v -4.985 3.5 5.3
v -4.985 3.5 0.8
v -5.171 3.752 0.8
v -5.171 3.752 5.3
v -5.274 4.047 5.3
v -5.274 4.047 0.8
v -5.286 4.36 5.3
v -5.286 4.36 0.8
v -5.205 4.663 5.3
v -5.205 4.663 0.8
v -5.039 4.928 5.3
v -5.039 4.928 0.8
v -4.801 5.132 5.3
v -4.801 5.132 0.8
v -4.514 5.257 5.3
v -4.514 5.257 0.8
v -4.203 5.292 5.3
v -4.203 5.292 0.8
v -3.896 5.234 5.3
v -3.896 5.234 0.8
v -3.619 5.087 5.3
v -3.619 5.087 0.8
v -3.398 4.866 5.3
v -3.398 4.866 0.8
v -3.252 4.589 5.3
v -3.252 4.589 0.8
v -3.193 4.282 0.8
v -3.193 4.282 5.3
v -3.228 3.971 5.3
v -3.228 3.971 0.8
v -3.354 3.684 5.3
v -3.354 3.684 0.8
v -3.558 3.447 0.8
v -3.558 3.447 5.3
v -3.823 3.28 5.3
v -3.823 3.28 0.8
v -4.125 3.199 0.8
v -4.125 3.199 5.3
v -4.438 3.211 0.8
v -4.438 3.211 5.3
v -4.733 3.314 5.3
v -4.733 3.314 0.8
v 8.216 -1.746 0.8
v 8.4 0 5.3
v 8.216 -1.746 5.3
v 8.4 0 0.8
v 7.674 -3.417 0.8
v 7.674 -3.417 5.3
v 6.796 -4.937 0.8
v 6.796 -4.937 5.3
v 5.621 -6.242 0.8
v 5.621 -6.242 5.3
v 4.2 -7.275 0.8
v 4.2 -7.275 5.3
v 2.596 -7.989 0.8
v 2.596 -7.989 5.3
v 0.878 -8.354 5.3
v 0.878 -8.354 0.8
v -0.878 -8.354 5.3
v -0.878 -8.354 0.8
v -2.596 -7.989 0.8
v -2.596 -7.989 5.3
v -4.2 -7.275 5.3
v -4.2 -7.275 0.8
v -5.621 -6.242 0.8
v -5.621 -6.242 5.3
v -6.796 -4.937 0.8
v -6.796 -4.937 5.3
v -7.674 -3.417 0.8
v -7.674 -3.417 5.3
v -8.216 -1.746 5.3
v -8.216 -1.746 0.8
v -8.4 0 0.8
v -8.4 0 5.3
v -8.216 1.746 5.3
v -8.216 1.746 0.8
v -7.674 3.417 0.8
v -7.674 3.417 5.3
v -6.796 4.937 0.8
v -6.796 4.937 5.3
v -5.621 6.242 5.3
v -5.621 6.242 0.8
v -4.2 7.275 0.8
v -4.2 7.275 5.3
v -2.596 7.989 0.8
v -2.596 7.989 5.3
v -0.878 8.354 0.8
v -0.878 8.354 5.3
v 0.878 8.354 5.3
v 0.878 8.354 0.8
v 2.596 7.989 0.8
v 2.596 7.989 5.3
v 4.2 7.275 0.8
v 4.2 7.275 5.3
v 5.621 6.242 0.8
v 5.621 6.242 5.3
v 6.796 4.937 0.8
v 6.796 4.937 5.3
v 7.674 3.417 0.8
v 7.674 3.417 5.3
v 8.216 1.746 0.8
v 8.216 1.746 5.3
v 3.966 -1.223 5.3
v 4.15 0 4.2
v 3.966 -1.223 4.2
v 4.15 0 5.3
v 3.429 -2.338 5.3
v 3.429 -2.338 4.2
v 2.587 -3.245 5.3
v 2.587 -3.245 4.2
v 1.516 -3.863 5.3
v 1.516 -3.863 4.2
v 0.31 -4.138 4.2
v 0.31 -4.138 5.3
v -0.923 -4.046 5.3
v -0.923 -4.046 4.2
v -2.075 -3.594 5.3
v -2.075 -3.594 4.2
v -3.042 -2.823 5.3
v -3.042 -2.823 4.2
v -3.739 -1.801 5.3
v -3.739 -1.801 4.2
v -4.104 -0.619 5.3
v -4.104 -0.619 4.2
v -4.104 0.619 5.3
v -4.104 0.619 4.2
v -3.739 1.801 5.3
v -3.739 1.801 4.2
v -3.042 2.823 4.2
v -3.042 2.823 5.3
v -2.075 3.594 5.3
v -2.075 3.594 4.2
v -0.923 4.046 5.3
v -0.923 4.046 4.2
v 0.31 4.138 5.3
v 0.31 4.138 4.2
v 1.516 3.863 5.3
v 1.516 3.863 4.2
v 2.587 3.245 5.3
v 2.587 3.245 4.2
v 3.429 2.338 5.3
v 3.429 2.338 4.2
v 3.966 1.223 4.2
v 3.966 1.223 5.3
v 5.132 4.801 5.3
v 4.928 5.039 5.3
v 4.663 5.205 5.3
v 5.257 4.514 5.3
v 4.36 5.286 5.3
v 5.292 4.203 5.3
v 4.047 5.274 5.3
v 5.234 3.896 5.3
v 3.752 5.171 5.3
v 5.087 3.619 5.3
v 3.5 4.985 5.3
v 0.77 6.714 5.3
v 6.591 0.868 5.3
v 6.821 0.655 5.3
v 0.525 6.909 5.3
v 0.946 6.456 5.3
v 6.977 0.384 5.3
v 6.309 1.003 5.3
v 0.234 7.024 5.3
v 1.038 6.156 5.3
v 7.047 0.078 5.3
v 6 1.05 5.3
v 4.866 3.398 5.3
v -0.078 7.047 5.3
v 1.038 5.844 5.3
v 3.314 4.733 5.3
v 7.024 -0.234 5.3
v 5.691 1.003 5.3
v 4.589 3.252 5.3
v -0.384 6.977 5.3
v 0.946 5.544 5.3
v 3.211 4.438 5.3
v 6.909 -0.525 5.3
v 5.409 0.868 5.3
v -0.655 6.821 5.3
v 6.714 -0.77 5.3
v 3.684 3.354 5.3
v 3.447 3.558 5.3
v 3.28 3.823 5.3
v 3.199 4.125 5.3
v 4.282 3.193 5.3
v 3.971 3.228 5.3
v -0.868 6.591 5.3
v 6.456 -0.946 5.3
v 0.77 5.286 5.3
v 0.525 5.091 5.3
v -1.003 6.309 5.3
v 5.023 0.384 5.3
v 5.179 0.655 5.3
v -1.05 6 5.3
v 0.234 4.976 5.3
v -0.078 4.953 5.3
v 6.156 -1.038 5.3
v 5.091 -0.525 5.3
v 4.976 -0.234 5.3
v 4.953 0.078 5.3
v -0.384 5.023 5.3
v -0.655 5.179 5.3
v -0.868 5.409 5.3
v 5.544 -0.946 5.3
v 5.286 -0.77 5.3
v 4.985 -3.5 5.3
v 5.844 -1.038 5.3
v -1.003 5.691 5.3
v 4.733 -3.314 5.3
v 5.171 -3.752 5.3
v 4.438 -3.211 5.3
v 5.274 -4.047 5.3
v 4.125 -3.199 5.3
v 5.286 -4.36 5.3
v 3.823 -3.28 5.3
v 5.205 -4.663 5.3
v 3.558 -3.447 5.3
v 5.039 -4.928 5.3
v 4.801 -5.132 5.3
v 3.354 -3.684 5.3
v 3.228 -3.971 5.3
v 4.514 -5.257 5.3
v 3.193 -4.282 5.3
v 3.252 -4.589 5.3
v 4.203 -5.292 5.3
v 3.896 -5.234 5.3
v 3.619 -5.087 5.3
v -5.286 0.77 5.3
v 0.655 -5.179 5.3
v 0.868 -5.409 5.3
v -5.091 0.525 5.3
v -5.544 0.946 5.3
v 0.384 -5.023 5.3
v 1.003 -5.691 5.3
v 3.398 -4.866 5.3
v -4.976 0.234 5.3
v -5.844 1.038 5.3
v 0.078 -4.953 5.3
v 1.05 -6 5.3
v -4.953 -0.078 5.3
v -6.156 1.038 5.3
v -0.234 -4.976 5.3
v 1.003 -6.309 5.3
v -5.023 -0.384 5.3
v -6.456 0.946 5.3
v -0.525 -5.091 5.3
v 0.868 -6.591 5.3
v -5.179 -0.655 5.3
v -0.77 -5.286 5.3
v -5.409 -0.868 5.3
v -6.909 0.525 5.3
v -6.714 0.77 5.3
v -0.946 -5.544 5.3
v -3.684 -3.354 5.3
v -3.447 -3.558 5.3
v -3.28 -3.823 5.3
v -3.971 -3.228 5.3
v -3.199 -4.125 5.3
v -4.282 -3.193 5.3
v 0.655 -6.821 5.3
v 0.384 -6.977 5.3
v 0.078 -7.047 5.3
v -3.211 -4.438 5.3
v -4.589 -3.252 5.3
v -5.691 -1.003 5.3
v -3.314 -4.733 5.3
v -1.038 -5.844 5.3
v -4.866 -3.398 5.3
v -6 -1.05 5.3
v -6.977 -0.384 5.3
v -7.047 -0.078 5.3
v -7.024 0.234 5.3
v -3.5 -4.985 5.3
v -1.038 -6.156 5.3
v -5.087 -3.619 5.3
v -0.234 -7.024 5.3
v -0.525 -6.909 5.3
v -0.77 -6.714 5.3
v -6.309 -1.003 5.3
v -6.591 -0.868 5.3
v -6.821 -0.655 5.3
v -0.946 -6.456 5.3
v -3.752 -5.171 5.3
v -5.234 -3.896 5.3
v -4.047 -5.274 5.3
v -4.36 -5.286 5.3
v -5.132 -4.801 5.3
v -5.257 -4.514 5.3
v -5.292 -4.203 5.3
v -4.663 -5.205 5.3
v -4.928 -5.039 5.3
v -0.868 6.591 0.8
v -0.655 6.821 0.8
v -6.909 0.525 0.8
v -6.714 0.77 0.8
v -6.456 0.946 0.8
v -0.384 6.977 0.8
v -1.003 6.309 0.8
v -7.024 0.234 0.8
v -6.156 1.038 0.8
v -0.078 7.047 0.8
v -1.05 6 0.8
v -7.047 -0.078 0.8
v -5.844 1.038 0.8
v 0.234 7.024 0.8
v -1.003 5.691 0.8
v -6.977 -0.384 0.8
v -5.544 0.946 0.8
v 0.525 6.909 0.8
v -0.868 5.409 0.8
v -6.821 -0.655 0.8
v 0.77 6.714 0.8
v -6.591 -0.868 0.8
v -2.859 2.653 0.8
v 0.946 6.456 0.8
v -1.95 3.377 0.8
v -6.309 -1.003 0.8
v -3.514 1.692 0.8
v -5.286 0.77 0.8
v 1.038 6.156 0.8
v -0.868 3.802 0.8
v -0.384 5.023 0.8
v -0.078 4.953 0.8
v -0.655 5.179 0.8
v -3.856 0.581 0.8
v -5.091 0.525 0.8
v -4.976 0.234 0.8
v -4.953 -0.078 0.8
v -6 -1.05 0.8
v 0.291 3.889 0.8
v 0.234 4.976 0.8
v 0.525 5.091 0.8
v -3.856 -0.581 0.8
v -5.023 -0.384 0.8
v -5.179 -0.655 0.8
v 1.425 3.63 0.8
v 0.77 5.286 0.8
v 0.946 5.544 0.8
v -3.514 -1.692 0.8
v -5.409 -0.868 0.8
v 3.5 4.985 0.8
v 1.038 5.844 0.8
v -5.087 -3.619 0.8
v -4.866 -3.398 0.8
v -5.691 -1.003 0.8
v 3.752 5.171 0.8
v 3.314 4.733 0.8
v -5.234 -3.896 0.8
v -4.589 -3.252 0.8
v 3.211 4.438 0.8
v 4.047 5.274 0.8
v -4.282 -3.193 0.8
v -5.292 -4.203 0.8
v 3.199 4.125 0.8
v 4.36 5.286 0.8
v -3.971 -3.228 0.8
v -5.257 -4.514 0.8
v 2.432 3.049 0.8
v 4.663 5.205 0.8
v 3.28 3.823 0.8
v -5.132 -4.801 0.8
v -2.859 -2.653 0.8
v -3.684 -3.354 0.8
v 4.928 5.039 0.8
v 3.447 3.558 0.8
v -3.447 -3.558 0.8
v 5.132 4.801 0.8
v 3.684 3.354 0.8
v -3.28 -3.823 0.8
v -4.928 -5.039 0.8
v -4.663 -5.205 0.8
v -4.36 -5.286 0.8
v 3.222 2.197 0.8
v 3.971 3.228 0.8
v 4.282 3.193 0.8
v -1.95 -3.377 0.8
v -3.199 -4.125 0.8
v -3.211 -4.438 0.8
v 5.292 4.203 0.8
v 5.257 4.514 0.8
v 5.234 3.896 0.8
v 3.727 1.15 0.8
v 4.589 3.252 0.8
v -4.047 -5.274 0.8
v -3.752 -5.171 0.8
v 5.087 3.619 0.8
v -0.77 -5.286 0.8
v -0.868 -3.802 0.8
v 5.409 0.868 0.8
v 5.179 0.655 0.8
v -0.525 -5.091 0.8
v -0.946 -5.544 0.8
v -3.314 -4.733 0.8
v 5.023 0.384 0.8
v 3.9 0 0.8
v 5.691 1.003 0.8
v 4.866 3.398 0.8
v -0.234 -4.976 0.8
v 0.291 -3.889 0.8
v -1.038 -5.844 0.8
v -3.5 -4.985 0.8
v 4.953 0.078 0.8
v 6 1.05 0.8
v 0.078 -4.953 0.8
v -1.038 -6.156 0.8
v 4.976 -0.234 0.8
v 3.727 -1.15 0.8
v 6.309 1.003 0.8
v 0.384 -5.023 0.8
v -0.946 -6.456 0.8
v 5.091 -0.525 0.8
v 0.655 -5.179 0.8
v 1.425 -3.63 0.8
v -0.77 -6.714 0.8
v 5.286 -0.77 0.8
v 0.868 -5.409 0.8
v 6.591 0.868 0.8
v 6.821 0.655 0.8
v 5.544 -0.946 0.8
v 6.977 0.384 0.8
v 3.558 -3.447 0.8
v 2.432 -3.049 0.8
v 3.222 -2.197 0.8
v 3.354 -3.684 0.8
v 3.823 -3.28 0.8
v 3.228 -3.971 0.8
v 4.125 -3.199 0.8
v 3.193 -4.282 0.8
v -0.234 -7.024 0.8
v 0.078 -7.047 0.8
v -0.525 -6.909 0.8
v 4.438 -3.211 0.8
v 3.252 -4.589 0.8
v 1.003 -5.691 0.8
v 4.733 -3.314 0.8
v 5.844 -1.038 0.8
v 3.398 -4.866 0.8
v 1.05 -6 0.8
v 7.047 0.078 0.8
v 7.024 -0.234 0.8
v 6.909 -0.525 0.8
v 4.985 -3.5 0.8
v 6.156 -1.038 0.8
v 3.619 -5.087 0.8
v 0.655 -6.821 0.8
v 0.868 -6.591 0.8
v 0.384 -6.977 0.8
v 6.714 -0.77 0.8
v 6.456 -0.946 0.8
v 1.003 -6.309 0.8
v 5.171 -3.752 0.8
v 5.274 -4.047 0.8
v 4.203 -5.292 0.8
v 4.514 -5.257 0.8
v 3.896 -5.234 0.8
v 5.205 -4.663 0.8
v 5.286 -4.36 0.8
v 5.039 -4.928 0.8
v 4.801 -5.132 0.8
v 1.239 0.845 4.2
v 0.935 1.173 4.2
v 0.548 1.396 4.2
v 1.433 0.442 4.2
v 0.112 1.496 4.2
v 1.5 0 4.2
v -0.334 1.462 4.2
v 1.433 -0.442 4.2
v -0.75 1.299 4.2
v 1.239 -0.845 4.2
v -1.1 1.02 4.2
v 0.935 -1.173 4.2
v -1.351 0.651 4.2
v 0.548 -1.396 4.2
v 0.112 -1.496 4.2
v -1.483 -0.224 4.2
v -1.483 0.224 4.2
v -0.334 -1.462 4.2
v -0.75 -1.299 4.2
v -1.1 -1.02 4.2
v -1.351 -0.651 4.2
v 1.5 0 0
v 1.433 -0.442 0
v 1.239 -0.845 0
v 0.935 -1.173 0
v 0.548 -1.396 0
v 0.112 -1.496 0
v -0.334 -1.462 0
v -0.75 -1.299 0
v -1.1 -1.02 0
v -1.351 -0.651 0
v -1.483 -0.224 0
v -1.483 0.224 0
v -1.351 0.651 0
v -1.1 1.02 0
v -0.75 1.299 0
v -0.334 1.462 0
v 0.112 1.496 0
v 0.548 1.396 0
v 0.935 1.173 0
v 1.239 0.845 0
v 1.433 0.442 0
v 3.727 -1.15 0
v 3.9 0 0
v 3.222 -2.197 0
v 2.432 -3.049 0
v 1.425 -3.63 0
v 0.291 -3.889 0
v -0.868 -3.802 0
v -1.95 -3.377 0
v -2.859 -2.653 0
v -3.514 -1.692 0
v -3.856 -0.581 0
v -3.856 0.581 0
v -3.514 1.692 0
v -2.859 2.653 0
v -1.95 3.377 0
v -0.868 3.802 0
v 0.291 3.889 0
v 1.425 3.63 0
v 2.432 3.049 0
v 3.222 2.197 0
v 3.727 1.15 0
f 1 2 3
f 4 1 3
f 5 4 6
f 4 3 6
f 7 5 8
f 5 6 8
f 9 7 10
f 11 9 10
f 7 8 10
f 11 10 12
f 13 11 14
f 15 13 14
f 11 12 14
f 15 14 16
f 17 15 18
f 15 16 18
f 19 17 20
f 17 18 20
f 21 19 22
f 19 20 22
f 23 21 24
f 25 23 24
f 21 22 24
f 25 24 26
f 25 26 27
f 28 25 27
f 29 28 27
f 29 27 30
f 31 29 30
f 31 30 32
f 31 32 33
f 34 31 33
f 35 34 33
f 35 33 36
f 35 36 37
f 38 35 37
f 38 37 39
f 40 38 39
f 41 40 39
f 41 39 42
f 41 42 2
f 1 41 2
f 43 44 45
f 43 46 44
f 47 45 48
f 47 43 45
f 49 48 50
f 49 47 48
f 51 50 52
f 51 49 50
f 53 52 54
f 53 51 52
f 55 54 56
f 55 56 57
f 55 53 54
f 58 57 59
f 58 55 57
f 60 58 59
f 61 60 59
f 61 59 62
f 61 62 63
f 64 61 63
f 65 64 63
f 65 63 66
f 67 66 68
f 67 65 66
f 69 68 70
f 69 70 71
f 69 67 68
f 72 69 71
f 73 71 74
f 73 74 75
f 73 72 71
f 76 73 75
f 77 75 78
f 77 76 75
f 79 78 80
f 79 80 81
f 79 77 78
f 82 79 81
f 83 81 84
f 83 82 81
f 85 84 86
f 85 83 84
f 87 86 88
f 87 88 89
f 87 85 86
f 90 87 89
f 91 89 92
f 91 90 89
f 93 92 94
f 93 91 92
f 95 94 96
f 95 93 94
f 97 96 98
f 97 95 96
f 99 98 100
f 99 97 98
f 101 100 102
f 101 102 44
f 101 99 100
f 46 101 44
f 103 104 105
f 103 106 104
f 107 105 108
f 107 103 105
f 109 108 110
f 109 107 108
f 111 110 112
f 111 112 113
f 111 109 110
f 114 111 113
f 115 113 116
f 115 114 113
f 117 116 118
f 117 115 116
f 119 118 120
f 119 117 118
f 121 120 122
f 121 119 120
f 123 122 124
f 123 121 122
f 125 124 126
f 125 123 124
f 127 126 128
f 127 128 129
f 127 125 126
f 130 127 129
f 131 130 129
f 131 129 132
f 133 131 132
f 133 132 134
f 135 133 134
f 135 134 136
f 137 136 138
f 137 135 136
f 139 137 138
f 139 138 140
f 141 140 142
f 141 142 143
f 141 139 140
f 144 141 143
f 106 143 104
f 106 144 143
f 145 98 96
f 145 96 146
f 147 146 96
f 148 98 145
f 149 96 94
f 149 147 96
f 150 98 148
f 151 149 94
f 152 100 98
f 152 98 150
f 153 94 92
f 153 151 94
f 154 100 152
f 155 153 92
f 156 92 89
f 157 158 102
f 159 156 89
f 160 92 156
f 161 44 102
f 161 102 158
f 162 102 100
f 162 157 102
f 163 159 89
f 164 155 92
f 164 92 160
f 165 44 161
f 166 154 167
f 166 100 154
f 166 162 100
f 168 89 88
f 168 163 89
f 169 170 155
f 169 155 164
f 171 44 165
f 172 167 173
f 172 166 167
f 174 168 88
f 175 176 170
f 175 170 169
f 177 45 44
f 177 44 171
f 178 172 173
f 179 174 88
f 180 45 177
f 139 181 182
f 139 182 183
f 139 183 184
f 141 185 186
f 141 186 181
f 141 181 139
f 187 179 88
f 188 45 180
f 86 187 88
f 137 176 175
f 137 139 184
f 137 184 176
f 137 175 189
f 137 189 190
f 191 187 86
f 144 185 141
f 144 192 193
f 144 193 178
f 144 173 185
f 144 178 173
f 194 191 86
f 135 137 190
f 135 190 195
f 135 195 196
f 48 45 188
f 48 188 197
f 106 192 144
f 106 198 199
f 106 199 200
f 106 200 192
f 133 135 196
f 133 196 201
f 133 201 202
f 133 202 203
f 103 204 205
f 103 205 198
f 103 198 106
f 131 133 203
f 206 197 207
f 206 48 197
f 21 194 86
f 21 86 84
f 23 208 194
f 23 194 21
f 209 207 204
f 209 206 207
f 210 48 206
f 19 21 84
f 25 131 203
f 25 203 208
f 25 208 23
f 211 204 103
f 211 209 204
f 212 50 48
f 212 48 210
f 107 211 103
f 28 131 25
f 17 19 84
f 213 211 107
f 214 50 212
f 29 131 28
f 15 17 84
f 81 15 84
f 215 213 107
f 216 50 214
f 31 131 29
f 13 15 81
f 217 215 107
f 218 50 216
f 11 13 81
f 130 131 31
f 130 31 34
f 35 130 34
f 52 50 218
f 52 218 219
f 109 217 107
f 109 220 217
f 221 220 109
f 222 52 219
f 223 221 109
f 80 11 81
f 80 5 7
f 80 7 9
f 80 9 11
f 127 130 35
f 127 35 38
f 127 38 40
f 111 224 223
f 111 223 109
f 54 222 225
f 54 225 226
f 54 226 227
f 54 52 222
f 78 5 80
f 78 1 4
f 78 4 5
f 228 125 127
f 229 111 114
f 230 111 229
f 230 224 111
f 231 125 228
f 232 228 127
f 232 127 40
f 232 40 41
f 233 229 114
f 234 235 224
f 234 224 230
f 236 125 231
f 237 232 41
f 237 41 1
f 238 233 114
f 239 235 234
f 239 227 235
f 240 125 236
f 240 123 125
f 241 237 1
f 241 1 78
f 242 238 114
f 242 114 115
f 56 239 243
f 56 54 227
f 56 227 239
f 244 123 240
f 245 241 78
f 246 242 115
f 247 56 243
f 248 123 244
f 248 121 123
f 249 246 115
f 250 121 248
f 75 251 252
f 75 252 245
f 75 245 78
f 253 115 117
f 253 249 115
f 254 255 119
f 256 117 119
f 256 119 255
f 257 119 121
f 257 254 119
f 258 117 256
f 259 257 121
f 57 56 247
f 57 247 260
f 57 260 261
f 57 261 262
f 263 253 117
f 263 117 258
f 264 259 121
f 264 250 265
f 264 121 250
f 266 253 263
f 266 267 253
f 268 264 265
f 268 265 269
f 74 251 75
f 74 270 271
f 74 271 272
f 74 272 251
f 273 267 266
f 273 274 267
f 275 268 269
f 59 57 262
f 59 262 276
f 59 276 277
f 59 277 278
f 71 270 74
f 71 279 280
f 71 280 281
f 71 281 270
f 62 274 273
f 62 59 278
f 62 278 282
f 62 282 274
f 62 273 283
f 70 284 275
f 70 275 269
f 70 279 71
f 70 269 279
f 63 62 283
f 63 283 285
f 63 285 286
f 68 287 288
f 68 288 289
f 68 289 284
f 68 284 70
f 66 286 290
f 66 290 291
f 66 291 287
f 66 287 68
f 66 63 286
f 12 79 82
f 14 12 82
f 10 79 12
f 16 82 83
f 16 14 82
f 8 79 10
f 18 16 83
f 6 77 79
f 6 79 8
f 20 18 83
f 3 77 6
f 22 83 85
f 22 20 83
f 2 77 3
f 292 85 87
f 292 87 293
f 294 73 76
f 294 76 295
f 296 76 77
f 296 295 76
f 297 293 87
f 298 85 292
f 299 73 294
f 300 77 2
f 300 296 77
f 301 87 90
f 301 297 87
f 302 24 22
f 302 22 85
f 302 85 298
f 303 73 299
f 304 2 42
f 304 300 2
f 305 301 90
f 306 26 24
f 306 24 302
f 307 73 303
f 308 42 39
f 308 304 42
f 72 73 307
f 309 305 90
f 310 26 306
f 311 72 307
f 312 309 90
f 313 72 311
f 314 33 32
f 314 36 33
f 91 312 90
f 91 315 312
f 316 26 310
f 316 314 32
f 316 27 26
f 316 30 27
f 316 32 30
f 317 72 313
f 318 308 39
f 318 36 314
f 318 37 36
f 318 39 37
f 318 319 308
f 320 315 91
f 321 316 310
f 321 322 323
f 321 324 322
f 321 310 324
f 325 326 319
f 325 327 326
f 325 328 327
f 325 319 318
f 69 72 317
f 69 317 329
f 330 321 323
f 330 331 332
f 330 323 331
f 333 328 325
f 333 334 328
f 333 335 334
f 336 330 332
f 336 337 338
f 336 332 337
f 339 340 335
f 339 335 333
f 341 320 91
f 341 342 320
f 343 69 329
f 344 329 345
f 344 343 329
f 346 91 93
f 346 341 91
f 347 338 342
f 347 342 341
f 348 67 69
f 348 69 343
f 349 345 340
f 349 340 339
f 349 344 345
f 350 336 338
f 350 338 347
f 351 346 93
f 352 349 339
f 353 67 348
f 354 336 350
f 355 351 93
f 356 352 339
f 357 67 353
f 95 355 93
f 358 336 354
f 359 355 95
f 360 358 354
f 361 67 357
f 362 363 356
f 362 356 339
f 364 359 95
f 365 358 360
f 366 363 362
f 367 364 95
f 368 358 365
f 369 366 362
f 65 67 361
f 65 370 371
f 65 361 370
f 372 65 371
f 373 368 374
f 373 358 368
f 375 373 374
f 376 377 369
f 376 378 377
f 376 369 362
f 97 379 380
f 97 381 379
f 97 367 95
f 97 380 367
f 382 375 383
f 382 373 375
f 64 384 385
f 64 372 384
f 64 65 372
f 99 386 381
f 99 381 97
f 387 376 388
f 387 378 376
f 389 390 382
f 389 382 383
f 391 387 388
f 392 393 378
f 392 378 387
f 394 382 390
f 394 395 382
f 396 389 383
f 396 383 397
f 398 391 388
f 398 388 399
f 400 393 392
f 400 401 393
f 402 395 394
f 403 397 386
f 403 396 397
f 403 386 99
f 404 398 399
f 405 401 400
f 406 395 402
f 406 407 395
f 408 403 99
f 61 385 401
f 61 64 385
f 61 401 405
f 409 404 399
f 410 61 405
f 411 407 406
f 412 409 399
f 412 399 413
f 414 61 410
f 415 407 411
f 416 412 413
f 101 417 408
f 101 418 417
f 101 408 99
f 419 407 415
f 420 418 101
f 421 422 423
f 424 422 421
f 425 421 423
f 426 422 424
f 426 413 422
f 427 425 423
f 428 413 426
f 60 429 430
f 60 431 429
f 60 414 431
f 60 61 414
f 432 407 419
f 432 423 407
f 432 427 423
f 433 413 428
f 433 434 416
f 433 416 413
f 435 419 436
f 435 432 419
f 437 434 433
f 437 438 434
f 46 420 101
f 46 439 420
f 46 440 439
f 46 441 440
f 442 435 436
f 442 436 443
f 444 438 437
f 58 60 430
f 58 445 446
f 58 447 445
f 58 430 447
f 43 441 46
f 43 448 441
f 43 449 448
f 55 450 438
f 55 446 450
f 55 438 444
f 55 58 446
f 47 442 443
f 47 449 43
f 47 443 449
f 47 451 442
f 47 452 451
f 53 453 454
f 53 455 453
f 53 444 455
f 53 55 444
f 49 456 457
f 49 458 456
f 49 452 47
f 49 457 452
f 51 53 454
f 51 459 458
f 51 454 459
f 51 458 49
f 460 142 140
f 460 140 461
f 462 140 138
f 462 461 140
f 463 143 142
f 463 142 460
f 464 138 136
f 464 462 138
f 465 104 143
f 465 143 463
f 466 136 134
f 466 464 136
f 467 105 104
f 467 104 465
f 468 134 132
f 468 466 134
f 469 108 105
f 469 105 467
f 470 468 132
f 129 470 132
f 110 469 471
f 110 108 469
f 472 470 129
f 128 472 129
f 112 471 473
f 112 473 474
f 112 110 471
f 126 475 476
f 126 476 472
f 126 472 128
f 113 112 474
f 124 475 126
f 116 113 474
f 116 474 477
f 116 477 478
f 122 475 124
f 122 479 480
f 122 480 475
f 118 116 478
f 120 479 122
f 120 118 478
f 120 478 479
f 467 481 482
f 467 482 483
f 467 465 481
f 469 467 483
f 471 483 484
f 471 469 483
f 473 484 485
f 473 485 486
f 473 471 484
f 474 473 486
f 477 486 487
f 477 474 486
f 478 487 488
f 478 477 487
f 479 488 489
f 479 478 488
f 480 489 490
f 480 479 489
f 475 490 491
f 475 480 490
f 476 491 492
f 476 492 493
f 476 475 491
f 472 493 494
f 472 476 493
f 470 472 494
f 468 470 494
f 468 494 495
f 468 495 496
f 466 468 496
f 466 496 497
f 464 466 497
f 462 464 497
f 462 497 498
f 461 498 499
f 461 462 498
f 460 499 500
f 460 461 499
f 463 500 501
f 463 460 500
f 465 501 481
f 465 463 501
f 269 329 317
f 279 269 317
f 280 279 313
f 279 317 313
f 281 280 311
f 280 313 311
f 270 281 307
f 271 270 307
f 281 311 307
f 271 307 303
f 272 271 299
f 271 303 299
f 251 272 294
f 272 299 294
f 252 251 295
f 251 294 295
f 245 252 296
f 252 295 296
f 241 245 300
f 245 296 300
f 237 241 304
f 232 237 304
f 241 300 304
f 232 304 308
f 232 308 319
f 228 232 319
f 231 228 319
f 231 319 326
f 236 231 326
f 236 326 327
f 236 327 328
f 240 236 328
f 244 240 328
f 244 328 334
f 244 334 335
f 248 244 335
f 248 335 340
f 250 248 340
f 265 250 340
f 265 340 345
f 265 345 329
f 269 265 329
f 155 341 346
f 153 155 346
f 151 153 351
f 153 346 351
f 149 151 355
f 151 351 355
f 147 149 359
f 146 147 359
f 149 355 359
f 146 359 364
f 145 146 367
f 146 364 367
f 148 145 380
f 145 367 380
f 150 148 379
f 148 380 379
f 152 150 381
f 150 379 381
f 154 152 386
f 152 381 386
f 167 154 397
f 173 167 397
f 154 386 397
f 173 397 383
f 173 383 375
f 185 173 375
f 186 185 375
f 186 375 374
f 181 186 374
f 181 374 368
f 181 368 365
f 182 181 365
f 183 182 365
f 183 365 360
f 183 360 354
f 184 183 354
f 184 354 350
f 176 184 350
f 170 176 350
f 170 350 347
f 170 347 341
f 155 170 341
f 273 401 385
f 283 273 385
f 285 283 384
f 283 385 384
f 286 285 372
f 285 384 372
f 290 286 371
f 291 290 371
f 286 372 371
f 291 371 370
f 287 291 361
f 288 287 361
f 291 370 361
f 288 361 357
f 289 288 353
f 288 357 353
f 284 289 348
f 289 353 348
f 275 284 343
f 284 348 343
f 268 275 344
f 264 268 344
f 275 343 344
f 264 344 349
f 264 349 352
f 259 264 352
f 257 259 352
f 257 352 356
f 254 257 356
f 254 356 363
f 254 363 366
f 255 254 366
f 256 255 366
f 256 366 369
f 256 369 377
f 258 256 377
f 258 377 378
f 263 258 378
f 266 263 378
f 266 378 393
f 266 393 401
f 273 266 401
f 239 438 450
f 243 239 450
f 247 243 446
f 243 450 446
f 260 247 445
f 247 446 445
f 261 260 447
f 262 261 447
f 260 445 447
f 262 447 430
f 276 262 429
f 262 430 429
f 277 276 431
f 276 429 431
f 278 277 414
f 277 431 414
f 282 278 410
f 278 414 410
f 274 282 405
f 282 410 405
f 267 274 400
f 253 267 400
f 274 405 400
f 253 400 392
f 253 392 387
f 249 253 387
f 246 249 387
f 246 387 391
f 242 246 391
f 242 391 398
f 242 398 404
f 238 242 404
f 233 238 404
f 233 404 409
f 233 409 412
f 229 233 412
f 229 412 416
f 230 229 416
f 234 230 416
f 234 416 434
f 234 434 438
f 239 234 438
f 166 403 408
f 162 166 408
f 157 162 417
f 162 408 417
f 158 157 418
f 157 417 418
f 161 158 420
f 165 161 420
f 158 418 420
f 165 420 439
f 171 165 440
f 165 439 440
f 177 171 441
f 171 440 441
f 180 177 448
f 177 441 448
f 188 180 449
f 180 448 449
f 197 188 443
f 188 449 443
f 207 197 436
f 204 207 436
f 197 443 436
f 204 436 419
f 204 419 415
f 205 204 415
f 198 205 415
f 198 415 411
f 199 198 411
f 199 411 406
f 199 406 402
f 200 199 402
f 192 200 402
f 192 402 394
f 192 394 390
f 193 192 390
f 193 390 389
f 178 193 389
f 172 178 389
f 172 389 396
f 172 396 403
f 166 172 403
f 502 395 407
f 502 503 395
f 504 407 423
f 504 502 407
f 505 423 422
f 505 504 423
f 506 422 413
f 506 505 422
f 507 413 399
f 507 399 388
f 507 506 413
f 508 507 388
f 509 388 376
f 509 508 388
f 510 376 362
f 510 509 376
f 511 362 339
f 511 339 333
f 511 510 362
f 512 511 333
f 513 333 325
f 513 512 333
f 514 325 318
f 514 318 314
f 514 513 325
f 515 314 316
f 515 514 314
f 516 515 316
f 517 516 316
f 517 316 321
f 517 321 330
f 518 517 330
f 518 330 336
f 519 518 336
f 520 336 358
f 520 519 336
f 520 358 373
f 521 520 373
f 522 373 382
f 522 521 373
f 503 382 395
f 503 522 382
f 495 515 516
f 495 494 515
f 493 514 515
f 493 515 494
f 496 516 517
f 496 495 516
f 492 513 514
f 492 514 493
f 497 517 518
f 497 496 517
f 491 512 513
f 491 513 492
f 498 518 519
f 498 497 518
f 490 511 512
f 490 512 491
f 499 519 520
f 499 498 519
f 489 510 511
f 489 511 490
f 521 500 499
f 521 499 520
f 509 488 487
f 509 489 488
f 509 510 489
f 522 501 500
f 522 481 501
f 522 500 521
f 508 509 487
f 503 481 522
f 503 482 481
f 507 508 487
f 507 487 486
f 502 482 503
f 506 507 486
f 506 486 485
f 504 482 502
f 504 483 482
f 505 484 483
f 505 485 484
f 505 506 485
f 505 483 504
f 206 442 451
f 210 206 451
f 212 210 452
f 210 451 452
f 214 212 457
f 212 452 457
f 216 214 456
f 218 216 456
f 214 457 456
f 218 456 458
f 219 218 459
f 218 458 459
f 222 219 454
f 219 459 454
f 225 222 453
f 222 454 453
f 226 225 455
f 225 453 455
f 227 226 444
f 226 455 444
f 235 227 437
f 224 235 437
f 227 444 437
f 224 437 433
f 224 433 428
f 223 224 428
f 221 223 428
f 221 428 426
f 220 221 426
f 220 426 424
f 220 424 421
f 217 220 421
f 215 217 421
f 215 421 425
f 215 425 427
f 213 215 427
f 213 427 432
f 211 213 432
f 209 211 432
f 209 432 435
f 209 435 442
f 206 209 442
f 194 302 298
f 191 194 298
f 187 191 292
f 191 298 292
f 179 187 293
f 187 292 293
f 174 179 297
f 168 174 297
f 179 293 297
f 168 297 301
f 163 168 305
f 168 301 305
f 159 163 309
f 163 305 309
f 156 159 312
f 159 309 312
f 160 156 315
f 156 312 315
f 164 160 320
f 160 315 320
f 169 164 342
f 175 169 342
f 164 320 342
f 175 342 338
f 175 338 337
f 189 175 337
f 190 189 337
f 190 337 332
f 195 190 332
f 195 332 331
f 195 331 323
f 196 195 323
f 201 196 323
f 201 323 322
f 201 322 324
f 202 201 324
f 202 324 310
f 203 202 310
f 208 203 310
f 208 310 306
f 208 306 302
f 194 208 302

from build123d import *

# Parameters (mm, degrees)
SKETCH_3_R               = 1.05
CUT_EXTRUDE_1_DEPTH      = 13.703149216
PATTERN_CIRCULAR_1_COUNT = 8


with BuildPart() as part:
    # ｽｹｯﾁ2 → 回転1 (revolve)
    with BuildSketch(Plane(origin=(0, 0, 0), x_dir=(1, 0, 0), z_dir=(0, 1, 0))):
        Polygon((3.9, 0), (1.5, 0), (1.5, -4.2), (4.15, -4.2), (4.15, -5.3), (8.4, -5.3), (8.4, -0.8), (3.9, -0.8), align=None)
    revolve(axis=Axis((0, 0, 4.2), (0, 0, -1)))

    # ｽｹｯﾁ3 → ｶｯﾄ - 押し出し1 (cut, through all)
    with BuildSketch(Plane(origin=(0, 0, 0.8), x_dir=(-1, 0, 0), z_dir=(0, 0, -1))):
        with Locations((0, 6)):
            Circle(SKETCH_3_R)
    cut_extrude_1 = extrude(amount=-CUT_EXTRUDE_1_DEPTH, mode=Mode.SUBTRACT)

    # 円形ﾊﾟﾀｰﾝ1: ｶｯﾄ - 押し出し1 ×8 about axis
    pattern_circular_1_axis = Axis((0, 0, 0), (0, 0, 1))
    for i in range(1, PATTERN_CIRCULAR_1_COUNT):
        add(cut_extrude_1.rotate(pattern_circular_1_axis, i * 360 / PATTERN_CIRCULAR_1_COUNT), mode=Mode.SUBTRACT)


solid = part.part
